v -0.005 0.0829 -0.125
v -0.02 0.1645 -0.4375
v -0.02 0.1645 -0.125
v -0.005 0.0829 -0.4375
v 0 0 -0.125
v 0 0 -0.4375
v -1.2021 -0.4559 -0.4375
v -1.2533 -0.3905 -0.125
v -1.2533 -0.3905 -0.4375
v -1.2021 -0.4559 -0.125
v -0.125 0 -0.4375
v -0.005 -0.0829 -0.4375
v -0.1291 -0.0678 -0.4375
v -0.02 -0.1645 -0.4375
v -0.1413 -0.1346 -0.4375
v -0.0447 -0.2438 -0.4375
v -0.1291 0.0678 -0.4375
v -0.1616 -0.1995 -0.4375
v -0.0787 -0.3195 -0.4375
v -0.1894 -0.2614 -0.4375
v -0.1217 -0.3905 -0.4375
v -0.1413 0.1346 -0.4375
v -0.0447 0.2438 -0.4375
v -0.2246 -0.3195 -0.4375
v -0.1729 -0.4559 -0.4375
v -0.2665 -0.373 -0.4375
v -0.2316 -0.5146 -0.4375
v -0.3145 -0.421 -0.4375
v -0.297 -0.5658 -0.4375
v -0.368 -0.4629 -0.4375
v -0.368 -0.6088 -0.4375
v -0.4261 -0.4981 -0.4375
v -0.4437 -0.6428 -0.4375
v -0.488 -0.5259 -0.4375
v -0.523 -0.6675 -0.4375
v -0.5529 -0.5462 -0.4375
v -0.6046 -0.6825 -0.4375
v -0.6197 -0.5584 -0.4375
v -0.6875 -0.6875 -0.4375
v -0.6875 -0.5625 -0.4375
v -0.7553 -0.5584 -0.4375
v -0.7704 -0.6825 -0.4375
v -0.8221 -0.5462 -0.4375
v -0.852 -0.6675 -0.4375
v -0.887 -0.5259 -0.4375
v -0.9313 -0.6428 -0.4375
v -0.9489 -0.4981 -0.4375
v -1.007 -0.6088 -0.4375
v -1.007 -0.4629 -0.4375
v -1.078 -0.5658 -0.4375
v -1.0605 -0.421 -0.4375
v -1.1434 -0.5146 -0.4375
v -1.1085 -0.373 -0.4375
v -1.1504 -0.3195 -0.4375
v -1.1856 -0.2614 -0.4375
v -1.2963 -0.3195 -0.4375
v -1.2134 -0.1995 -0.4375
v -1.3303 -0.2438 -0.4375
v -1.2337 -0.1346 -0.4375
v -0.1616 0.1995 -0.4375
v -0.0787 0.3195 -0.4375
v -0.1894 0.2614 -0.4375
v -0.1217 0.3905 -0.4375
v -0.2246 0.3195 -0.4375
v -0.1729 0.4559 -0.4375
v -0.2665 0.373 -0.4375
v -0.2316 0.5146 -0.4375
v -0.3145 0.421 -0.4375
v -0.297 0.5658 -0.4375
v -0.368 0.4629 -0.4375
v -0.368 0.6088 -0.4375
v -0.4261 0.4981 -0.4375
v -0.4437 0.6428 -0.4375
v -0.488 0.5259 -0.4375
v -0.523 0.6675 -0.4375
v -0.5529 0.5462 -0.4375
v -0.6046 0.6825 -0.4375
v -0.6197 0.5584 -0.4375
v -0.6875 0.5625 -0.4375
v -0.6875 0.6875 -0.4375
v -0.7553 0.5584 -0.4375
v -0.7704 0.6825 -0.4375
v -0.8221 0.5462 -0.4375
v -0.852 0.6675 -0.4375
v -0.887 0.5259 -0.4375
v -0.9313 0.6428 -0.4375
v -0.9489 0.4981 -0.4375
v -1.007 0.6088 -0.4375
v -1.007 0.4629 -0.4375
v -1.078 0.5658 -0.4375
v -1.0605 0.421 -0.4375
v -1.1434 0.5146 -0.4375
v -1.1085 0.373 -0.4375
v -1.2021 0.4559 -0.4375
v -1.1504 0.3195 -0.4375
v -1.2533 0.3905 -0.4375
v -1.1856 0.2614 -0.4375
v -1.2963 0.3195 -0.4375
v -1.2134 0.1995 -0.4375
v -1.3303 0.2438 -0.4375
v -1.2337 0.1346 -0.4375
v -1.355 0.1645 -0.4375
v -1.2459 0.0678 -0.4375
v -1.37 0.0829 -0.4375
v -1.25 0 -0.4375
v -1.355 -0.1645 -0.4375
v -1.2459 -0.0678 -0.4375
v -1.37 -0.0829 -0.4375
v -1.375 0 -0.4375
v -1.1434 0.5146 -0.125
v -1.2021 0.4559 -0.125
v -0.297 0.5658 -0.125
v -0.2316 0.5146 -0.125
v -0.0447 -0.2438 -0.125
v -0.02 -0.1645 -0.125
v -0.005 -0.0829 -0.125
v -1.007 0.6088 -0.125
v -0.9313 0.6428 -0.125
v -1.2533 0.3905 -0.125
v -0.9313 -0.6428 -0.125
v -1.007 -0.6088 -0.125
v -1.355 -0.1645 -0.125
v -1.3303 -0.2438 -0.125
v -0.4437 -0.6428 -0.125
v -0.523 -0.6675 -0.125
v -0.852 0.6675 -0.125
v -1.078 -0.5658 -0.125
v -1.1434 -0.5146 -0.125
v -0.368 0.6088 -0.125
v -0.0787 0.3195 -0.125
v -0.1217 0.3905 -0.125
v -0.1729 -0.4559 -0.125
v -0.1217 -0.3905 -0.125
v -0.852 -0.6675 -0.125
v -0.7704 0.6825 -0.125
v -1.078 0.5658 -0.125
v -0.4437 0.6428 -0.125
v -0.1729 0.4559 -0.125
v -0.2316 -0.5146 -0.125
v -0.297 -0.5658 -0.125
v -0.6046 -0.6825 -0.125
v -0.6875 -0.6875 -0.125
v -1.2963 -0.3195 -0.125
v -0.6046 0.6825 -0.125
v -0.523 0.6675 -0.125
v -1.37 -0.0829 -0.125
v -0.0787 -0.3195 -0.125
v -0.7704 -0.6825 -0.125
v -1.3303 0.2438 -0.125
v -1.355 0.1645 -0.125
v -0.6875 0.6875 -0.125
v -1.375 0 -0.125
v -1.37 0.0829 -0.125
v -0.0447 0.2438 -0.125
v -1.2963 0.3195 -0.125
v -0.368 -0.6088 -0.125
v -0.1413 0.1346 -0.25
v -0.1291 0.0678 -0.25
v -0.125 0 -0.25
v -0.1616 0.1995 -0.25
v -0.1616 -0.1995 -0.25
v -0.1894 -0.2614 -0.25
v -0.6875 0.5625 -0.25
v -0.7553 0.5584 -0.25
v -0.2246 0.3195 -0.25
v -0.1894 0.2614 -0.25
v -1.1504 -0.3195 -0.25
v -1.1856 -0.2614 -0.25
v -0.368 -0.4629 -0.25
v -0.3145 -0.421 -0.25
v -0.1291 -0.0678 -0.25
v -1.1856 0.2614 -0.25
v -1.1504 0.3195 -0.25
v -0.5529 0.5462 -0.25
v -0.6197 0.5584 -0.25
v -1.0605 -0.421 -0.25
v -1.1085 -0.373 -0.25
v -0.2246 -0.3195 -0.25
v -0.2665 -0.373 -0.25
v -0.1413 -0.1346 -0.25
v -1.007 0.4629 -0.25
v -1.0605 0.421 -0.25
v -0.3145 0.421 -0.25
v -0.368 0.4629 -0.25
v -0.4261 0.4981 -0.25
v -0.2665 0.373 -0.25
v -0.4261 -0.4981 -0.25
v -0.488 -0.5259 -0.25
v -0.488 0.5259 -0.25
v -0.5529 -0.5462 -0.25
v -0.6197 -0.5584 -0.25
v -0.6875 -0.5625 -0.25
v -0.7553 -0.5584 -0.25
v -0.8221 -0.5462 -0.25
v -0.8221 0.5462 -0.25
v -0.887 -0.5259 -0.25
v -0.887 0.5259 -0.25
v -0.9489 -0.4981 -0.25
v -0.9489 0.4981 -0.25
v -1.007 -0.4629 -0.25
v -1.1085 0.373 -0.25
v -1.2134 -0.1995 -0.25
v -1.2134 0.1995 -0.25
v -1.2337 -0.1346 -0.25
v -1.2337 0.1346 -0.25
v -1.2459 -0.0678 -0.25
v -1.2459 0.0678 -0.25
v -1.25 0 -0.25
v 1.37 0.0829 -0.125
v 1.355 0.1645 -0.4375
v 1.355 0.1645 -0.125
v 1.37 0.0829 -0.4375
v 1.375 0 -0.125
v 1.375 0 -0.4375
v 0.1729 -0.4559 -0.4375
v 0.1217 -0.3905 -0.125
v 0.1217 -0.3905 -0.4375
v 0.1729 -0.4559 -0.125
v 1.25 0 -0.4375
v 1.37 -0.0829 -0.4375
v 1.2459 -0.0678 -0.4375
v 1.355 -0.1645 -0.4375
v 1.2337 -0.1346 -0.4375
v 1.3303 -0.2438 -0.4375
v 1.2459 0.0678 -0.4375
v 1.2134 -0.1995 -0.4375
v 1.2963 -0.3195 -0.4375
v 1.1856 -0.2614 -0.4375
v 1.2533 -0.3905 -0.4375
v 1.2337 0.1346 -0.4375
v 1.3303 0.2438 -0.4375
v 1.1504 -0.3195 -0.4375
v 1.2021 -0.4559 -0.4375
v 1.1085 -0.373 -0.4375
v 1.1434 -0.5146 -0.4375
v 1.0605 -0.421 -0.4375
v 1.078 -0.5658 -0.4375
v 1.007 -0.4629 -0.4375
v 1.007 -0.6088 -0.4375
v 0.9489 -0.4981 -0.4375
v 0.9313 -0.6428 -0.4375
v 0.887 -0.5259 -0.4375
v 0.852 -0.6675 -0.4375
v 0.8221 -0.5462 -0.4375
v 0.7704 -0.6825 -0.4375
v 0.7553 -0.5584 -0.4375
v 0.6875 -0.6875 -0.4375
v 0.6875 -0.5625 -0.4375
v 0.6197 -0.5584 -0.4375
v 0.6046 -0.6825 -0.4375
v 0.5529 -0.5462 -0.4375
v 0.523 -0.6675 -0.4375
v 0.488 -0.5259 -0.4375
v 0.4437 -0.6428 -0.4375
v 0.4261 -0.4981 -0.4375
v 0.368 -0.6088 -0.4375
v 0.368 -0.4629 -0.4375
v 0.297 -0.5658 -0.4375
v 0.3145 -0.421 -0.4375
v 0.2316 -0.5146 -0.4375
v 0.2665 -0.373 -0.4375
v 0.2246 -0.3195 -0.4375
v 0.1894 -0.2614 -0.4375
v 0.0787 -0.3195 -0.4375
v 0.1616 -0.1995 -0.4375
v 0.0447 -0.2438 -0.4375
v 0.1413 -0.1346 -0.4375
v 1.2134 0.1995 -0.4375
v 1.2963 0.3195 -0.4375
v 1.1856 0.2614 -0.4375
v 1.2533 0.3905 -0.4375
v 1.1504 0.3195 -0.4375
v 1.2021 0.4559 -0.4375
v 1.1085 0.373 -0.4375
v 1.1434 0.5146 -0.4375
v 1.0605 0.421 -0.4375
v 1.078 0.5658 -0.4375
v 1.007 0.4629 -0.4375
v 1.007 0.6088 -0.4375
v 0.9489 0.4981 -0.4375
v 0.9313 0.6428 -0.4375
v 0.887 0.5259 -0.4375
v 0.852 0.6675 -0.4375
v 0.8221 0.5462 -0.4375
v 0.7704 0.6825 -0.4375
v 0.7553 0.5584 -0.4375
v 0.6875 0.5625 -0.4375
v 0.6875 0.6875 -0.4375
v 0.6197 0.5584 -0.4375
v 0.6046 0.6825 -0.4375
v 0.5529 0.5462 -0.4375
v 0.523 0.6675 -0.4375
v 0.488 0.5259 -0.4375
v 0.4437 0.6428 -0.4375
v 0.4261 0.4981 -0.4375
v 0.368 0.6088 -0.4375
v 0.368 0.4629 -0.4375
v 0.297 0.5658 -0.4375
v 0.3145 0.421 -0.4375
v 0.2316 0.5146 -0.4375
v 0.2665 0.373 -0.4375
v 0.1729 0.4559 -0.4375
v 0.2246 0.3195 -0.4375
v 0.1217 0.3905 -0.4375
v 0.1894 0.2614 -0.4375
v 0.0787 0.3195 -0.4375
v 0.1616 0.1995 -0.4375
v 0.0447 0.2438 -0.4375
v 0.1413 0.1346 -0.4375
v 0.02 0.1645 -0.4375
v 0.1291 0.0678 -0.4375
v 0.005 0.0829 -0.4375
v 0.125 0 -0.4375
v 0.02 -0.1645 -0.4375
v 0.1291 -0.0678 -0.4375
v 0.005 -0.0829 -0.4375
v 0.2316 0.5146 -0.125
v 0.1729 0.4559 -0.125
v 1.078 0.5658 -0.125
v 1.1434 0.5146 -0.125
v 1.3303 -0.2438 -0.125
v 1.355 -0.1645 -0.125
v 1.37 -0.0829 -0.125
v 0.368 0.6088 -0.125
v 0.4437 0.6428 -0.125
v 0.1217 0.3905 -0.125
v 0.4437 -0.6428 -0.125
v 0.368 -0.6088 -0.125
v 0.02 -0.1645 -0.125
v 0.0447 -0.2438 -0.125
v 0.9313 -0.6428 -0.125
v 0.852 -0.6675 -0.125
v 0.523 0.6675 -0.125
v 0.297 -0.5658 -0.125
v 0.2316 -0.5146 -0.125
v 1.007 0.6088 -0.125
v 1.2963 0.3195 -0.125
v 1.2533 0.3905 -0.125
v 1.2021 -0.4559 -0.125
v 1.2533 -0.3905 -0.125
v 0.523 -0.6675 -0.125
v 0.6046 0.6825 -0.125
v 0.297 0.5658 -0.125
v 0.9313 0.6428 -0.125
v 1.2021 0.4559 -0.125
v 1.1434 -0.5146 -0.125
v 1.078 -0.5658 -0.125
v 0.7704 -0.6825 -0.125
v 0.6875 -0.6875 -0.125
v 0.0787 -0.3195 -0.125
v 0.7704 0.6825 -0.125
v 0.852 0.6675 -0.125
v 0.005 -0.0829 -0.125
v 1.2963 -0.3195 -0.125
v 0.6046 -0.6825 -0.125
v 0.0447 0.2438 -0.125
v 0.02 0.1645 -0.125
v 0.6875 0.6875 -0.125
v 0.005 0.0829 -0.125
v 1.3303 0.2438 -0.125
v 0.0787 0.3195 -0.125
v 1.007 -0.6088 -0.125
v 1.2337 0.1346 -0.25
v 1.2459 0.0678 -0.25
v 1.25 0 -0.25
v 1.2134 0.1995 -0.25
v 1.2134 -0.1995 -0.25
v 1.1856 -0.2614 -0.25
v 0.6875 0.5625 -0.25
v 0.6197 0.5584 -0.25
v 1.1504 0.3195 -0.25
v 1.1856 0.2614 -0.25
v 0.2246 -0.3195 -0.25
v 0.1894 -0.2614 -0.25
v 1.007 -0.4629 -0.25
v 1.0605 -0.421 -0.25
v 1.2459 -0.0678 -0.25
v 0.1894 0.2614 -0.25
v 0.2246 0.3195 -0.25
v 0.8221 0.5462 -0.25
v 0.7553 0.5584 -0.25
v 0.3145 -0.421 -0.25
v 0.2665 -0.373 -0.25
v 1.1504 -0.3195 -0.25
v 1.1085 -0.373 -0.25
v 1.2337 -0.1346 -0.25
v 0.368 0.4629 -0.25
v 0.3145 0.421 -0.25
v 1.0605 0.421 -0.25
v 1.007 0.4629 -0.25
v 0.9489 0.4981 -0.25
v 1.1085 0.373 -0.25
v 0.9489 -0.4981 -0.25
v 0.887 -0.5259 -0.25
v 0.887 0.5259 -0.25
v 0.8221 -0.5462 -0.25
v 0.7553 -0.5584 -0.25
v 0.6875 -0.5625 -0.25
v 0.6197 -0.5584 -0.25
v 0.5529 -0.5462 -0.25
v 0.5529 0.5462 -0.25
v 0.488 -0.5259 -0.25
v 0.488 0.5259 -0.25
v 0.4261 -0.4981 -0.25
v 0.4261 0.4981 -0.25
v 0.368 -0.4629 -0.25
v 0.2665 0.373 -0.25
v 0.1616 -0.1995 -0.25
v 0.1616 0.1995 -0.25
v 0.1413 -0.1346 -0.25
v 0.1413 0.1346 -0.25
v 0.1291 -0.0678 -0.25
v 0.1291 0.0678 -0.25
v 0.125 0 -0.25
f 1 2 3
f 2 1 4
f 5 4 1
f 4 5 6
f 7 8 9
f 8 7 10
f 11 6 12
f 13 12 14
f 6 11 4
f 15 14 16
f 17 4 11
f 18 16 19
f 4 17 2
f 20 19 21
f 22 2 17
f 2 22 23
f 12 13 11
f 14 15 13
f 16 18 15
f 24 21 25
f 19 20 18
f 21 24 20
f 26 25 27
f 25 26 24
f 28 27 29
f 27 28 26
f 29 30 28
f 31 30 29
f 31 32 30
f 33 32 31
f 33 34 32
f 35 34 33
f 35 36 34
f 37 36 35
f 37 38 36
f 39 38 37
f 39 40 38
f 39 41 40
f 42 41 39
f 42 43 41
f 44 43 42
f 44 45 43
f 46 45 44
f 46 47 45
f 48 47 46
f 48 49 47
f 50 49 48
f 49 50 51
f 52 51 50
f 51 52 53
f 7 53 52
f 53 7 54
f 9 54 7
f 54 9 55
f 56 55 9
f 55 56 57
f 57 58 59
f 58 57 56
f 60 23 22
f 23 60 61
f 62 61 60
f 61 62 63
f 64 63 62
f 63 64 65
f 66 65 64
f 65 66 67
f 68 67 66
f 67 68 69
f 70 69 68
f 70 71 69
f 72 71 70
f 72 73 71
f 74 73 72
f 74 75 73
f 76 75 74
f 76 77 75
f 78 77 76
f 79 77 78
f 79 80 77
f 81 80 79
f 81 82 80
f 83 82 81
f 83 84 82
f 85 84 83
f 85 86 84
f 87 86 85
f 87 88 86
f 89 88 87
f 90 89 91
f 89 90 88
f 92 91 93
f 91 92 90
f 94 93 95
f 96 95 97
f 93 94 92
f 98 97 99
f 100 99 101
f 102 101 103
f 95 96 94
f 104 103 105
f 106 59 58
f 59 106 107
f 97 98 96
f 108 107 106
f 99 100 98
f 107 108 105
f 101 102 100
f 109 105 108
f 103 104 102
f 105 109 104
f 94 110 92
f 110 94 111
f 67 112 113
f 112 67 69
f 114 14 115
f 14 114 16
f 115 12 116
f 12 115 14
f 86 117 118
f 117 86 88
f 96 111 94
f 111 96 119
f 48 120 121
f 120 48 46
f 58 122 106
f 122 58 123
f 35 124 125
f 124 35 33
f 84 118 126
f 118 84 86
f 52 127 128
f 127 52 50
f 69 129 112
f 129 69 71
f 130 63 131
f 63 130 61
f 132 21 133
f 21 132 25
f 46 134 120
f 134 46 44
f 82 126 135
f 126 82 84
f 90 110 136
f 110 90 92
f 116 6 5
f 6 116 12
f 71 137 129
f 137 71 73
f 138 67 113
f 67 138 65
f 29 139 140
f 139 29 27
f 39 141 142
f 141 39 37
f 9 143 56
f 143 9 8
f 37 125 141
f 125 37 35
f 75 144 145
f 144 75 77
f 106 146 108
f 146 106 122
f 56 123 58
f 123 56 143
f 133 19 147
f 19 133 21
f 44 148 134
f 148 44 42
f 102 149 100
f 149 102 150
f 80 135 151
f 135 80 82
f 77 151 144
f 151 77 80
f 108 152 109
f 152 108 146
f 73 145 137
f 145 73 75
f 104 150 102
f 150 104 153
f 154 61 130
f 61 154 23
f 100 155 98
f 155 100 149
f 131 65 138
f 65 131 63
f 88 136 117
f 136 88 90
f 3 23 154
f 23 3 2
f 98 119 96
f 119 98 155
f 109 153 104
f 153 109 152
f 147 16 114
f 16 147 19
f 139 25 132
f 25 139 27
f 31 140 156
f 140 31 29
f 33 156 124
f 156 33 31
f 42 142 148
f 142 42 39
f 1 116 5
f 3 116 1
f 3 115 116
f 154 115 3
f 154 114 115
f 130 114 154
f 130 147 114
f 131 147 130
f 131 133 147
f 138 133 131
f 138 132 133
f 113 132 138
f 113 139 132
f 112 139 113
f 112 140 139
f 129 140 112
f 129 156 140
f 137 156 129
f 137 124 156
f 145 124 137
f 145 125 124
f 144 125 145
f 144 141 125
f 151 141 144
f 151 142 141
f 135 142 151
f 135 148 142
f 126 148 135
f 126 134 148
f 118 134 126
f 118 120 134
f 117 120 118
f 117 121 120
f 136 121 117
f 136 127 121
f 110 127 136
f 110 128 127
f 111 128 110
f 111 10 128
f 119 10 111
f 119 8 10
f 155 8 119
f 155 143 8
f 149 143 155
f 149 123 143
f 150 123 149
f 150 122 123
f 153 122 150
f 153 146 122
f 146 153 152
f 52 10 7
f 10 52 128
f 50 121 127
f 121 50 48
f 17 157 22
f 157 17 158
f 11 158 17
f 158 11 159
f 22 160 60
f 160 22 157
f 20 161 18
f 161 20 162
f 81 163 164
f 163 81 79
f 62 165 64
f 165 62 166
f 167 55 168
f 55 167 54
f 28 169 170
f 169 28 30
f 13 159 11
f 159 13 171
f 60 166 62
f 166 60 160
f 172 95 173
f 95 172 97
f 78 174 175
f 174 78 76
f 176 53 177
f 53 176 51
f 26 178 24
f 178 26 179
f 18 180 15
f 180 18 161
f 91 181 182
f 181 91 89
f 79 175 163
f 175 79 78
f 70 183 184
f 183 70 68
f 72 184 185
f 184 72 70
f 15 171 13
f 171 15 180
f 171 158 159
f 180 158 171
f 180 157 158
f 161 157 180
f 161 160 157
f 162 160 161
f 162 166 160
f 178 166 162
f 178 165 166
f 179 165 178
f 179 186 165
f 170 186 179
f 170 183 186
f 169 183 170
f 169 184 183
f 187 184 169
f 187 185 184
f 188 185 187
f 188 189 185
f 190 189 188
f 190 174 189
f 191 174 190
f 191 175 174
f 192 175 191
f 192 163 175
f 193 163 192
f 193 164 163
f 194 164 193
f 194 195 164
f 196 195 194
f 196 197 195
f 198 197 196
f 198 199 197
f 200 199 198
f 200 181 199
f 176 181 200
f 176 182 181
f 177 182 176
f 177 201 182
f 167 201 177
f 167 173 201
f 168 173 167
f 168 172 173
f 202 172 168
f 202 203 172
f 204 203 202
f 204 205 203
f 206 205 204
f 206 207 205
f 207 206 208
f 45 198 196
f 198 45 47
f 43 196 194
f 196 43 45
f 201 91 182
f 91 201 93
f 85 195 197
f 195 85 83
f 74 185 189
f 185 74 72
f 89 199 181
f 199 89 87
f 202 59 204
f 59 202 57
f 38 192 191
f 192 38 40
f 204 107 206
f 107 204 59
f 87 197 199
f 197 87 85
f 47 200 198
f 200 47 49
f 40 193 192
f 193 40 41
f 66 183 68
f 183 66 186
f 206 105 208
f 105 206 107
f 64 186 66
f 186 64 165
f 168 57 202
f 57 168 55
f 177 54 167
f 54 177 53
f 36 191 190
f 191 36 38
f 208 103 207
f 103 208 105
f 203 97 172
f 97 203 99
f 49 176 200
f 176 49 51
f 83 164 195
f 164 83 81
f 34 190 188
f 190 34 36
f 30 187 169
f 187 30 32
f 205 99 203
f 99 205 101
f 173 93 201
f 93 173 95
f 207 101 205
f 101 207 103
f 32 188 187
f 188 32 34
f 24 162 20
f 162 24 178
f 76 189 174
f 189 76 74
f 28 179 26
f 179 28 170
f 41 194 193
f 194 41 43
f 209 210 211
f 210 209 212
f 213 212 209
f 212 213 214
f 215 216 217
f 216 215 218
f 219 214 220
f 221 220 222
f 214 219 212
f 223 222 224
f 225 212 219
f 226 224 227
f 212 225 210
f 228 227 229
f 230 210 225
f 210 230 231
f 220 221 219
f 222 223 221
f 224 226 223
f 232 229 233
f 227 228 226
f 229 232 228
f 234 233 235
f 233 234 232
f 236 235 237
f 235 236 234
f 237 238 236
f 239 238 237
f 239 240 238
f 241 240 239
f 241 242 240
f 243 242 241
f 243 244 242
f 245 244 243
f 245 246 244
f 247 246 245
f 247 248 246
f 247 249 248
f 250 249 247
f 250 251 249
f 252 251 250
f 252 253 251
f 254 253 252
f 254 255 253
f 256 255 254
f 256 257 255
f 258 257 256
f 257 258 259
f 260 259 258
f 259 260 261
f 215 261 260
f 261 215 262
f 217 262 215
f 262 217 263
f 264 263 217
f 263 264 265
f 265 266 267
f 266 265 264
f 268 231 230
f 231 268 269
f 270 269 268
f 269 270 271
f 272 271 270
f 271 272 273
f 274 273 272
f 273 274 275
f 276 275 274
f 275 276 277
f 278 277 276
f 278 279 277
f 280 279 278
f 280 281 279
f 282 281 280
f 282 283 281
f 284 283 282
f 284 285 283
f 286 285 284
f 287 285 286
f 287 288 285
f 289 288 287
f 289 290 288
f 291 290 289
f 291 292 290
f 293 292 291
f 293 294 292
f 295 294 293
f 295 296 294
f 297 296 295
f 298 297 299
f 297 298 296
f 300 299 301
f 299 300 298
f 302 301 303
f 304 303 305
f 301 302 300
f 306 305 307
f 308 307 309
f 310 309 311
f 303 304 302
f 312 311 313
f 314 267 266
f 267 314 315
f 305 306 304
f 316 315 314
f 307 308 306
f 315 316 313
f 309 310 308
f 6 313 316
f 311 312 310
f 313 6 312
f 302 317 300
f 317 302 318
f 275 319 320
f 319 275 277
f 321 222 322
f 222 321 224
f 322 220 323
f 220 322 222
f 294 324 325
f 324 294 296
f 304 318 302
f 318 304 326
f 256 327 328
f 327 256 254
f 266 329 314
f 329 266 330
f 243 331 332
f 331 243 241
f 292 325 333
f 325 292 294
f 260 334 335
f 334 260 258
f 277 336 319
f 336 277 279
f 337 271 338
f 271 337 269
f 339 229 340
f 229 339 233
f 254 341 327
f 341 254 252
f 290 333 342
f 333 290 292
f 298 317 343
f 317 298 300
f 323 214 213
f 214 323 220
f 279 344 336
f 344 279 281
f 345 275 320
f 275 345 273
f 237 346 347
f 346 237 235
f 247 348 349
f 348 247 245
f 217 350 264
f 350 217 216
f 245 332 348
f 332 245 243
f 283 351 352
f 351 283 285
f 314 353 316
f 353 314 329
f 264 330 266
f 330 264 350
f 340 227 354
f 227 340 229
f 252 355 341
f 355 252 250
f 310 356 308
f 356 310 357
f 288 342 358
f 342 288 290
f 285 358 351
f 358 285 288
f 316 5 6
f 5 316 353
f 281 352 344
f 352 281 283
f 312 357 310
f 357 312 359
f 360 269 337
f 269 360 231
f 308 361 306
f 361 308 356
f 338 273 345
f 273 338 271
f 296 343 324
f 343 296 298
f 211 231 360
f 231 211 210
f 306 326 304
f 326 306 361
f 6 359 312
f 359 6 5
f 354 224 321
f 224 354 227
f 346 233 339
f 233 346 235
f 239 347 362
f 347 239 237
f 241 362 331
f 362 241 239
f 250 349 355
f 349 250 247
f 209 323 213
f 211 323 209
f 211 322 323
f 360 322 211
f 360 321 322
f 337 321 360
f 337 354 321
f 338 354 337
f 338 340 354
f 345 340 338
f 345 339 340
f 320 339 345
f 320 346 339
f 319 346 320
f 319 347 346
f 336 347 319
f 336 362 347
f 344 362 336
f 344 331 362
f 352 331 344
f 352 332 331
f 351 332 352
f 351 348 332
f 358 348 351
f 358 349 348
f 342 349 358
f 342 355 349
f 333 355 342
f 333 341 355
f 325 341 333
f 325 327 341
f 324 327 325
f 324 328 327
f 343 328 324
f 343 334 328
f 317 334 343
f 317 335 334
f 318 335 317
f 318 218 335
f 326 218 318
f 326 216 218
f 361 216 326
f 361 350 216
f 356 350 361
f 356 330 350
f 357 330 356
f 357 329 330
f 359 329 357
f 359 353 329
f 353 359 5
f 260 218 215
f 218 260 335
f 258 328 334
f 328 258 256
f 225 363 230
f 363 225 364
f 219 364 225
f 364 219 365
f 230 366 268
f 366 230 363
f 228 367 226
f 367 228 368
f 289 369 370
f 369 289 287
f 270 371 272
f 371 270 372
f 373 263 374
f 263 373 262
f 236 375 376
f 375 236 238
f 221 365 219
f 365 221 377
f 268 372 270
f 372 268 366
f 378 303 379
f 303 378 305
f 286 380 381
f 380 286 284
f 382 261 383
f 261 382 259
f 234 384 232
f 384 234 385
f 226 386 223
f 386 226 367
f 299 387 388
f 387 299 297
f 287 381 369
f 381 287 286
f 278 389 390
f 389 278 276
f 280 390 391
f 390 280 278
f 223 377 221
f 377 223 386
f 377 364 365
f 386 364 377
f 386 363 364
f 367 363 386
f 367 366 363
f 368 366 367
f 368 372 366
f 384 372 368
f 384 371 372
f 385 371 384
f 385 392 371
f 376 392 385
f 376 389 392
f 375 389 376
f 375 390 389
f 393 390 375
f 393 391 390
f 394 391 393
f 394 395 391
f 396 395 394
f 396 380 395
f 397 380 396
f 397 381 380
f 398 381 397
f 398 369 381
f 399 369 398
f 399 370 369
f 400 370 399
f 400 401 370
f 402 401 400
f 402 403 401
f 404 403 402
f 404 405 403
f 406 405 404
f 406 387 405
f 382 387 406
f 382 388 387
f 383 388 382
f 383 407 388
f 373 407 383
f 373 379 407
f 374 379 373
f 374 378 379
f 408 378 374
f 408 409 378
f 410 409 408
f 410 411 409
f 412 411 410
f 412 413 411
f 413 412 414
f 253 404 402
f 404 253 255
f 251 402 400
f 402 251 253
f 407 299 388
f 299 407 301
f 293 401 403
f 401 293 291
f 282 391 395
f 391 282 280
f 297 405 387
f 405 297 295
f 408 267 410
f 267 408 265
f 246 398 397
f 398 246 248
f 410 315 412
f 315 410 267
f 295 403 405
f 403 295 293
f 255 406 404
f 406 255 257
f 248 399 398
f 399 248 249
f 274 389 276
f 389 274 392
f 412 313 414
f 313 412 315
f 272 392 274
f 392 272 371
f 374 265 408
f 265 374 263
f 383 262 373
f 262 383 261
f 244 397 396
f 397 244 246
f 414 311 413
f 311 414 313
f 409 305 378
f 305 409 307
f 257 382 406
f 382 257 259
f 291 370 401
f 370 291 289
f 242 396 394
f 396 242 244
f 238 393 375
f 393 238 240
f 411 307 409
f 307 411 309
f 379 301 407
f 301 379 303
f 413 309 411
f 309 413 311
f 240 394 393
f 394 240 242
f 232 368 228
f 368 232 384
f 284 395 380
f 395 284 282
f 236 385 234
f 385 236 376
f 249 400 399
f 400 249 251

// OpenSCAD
//------------------------------------------------------------------
/*

Wallaby Cylinder Head

*/
//------------------------------------------------------------------
// scaling

_desired_scale = 1.25;
_al_shrink = 0.98;
_scale = _desired_scale / _al_shrink;

//------------------------------------------------------------------
// control the number of facets on cylinders

_accuracy = 0.001;
function fn(r) = 180 / acos(1 - (_accuracy / r));

//------------------------------------------------------------------

cylinder_h = 3/16;
cylinder_d = 1 + (1/8);
c2c_d = (1 + (3/8));
cylinder_wall = 1/8;
tweak = 1/64;

cylinder_r = cylinder_d / 2.0;

module cylinder_head(d) {
  translate([d, 0, -head_h / 2]) {
    difference() {
      cylinder(h = cylinder_h + cylinder_wall, r = cylinder_r + cylinder_wall, $fn = fn(cylinder_r));
      translate([0, 0, -tweak]) {
	     cylinder(h = cylinder_h + tweak, r = cylinder_r, $fn = fn(cylinder_r));
      }
    }
  }
}

module cylinder_heads() {
  cylinder_head(-c2c_d / 2.0);
  cylinder_head(c2c_d / 2.0);
}

//------------------------------------------------------------------

head_h = (1/2) + (3/8);

module head_walls() {
    linear_extrude(height = head_h, center = true)
    difference() {
	    import(file = "head_cover.dxf", layer = "head_wall_outer", $fn = fn(0.25));
	    import(file = "head_cover.dxf", layer = "head_wall_inner", $fn = fn(0.25));
	    import(file = "head_cover.dxf", layer = "head_wall_holes", $fn = fn(0.125));
    }
}

//------------------------------------------------------------------

head_walls();
cylinder_heads();

//------------------------------------------------------------------
